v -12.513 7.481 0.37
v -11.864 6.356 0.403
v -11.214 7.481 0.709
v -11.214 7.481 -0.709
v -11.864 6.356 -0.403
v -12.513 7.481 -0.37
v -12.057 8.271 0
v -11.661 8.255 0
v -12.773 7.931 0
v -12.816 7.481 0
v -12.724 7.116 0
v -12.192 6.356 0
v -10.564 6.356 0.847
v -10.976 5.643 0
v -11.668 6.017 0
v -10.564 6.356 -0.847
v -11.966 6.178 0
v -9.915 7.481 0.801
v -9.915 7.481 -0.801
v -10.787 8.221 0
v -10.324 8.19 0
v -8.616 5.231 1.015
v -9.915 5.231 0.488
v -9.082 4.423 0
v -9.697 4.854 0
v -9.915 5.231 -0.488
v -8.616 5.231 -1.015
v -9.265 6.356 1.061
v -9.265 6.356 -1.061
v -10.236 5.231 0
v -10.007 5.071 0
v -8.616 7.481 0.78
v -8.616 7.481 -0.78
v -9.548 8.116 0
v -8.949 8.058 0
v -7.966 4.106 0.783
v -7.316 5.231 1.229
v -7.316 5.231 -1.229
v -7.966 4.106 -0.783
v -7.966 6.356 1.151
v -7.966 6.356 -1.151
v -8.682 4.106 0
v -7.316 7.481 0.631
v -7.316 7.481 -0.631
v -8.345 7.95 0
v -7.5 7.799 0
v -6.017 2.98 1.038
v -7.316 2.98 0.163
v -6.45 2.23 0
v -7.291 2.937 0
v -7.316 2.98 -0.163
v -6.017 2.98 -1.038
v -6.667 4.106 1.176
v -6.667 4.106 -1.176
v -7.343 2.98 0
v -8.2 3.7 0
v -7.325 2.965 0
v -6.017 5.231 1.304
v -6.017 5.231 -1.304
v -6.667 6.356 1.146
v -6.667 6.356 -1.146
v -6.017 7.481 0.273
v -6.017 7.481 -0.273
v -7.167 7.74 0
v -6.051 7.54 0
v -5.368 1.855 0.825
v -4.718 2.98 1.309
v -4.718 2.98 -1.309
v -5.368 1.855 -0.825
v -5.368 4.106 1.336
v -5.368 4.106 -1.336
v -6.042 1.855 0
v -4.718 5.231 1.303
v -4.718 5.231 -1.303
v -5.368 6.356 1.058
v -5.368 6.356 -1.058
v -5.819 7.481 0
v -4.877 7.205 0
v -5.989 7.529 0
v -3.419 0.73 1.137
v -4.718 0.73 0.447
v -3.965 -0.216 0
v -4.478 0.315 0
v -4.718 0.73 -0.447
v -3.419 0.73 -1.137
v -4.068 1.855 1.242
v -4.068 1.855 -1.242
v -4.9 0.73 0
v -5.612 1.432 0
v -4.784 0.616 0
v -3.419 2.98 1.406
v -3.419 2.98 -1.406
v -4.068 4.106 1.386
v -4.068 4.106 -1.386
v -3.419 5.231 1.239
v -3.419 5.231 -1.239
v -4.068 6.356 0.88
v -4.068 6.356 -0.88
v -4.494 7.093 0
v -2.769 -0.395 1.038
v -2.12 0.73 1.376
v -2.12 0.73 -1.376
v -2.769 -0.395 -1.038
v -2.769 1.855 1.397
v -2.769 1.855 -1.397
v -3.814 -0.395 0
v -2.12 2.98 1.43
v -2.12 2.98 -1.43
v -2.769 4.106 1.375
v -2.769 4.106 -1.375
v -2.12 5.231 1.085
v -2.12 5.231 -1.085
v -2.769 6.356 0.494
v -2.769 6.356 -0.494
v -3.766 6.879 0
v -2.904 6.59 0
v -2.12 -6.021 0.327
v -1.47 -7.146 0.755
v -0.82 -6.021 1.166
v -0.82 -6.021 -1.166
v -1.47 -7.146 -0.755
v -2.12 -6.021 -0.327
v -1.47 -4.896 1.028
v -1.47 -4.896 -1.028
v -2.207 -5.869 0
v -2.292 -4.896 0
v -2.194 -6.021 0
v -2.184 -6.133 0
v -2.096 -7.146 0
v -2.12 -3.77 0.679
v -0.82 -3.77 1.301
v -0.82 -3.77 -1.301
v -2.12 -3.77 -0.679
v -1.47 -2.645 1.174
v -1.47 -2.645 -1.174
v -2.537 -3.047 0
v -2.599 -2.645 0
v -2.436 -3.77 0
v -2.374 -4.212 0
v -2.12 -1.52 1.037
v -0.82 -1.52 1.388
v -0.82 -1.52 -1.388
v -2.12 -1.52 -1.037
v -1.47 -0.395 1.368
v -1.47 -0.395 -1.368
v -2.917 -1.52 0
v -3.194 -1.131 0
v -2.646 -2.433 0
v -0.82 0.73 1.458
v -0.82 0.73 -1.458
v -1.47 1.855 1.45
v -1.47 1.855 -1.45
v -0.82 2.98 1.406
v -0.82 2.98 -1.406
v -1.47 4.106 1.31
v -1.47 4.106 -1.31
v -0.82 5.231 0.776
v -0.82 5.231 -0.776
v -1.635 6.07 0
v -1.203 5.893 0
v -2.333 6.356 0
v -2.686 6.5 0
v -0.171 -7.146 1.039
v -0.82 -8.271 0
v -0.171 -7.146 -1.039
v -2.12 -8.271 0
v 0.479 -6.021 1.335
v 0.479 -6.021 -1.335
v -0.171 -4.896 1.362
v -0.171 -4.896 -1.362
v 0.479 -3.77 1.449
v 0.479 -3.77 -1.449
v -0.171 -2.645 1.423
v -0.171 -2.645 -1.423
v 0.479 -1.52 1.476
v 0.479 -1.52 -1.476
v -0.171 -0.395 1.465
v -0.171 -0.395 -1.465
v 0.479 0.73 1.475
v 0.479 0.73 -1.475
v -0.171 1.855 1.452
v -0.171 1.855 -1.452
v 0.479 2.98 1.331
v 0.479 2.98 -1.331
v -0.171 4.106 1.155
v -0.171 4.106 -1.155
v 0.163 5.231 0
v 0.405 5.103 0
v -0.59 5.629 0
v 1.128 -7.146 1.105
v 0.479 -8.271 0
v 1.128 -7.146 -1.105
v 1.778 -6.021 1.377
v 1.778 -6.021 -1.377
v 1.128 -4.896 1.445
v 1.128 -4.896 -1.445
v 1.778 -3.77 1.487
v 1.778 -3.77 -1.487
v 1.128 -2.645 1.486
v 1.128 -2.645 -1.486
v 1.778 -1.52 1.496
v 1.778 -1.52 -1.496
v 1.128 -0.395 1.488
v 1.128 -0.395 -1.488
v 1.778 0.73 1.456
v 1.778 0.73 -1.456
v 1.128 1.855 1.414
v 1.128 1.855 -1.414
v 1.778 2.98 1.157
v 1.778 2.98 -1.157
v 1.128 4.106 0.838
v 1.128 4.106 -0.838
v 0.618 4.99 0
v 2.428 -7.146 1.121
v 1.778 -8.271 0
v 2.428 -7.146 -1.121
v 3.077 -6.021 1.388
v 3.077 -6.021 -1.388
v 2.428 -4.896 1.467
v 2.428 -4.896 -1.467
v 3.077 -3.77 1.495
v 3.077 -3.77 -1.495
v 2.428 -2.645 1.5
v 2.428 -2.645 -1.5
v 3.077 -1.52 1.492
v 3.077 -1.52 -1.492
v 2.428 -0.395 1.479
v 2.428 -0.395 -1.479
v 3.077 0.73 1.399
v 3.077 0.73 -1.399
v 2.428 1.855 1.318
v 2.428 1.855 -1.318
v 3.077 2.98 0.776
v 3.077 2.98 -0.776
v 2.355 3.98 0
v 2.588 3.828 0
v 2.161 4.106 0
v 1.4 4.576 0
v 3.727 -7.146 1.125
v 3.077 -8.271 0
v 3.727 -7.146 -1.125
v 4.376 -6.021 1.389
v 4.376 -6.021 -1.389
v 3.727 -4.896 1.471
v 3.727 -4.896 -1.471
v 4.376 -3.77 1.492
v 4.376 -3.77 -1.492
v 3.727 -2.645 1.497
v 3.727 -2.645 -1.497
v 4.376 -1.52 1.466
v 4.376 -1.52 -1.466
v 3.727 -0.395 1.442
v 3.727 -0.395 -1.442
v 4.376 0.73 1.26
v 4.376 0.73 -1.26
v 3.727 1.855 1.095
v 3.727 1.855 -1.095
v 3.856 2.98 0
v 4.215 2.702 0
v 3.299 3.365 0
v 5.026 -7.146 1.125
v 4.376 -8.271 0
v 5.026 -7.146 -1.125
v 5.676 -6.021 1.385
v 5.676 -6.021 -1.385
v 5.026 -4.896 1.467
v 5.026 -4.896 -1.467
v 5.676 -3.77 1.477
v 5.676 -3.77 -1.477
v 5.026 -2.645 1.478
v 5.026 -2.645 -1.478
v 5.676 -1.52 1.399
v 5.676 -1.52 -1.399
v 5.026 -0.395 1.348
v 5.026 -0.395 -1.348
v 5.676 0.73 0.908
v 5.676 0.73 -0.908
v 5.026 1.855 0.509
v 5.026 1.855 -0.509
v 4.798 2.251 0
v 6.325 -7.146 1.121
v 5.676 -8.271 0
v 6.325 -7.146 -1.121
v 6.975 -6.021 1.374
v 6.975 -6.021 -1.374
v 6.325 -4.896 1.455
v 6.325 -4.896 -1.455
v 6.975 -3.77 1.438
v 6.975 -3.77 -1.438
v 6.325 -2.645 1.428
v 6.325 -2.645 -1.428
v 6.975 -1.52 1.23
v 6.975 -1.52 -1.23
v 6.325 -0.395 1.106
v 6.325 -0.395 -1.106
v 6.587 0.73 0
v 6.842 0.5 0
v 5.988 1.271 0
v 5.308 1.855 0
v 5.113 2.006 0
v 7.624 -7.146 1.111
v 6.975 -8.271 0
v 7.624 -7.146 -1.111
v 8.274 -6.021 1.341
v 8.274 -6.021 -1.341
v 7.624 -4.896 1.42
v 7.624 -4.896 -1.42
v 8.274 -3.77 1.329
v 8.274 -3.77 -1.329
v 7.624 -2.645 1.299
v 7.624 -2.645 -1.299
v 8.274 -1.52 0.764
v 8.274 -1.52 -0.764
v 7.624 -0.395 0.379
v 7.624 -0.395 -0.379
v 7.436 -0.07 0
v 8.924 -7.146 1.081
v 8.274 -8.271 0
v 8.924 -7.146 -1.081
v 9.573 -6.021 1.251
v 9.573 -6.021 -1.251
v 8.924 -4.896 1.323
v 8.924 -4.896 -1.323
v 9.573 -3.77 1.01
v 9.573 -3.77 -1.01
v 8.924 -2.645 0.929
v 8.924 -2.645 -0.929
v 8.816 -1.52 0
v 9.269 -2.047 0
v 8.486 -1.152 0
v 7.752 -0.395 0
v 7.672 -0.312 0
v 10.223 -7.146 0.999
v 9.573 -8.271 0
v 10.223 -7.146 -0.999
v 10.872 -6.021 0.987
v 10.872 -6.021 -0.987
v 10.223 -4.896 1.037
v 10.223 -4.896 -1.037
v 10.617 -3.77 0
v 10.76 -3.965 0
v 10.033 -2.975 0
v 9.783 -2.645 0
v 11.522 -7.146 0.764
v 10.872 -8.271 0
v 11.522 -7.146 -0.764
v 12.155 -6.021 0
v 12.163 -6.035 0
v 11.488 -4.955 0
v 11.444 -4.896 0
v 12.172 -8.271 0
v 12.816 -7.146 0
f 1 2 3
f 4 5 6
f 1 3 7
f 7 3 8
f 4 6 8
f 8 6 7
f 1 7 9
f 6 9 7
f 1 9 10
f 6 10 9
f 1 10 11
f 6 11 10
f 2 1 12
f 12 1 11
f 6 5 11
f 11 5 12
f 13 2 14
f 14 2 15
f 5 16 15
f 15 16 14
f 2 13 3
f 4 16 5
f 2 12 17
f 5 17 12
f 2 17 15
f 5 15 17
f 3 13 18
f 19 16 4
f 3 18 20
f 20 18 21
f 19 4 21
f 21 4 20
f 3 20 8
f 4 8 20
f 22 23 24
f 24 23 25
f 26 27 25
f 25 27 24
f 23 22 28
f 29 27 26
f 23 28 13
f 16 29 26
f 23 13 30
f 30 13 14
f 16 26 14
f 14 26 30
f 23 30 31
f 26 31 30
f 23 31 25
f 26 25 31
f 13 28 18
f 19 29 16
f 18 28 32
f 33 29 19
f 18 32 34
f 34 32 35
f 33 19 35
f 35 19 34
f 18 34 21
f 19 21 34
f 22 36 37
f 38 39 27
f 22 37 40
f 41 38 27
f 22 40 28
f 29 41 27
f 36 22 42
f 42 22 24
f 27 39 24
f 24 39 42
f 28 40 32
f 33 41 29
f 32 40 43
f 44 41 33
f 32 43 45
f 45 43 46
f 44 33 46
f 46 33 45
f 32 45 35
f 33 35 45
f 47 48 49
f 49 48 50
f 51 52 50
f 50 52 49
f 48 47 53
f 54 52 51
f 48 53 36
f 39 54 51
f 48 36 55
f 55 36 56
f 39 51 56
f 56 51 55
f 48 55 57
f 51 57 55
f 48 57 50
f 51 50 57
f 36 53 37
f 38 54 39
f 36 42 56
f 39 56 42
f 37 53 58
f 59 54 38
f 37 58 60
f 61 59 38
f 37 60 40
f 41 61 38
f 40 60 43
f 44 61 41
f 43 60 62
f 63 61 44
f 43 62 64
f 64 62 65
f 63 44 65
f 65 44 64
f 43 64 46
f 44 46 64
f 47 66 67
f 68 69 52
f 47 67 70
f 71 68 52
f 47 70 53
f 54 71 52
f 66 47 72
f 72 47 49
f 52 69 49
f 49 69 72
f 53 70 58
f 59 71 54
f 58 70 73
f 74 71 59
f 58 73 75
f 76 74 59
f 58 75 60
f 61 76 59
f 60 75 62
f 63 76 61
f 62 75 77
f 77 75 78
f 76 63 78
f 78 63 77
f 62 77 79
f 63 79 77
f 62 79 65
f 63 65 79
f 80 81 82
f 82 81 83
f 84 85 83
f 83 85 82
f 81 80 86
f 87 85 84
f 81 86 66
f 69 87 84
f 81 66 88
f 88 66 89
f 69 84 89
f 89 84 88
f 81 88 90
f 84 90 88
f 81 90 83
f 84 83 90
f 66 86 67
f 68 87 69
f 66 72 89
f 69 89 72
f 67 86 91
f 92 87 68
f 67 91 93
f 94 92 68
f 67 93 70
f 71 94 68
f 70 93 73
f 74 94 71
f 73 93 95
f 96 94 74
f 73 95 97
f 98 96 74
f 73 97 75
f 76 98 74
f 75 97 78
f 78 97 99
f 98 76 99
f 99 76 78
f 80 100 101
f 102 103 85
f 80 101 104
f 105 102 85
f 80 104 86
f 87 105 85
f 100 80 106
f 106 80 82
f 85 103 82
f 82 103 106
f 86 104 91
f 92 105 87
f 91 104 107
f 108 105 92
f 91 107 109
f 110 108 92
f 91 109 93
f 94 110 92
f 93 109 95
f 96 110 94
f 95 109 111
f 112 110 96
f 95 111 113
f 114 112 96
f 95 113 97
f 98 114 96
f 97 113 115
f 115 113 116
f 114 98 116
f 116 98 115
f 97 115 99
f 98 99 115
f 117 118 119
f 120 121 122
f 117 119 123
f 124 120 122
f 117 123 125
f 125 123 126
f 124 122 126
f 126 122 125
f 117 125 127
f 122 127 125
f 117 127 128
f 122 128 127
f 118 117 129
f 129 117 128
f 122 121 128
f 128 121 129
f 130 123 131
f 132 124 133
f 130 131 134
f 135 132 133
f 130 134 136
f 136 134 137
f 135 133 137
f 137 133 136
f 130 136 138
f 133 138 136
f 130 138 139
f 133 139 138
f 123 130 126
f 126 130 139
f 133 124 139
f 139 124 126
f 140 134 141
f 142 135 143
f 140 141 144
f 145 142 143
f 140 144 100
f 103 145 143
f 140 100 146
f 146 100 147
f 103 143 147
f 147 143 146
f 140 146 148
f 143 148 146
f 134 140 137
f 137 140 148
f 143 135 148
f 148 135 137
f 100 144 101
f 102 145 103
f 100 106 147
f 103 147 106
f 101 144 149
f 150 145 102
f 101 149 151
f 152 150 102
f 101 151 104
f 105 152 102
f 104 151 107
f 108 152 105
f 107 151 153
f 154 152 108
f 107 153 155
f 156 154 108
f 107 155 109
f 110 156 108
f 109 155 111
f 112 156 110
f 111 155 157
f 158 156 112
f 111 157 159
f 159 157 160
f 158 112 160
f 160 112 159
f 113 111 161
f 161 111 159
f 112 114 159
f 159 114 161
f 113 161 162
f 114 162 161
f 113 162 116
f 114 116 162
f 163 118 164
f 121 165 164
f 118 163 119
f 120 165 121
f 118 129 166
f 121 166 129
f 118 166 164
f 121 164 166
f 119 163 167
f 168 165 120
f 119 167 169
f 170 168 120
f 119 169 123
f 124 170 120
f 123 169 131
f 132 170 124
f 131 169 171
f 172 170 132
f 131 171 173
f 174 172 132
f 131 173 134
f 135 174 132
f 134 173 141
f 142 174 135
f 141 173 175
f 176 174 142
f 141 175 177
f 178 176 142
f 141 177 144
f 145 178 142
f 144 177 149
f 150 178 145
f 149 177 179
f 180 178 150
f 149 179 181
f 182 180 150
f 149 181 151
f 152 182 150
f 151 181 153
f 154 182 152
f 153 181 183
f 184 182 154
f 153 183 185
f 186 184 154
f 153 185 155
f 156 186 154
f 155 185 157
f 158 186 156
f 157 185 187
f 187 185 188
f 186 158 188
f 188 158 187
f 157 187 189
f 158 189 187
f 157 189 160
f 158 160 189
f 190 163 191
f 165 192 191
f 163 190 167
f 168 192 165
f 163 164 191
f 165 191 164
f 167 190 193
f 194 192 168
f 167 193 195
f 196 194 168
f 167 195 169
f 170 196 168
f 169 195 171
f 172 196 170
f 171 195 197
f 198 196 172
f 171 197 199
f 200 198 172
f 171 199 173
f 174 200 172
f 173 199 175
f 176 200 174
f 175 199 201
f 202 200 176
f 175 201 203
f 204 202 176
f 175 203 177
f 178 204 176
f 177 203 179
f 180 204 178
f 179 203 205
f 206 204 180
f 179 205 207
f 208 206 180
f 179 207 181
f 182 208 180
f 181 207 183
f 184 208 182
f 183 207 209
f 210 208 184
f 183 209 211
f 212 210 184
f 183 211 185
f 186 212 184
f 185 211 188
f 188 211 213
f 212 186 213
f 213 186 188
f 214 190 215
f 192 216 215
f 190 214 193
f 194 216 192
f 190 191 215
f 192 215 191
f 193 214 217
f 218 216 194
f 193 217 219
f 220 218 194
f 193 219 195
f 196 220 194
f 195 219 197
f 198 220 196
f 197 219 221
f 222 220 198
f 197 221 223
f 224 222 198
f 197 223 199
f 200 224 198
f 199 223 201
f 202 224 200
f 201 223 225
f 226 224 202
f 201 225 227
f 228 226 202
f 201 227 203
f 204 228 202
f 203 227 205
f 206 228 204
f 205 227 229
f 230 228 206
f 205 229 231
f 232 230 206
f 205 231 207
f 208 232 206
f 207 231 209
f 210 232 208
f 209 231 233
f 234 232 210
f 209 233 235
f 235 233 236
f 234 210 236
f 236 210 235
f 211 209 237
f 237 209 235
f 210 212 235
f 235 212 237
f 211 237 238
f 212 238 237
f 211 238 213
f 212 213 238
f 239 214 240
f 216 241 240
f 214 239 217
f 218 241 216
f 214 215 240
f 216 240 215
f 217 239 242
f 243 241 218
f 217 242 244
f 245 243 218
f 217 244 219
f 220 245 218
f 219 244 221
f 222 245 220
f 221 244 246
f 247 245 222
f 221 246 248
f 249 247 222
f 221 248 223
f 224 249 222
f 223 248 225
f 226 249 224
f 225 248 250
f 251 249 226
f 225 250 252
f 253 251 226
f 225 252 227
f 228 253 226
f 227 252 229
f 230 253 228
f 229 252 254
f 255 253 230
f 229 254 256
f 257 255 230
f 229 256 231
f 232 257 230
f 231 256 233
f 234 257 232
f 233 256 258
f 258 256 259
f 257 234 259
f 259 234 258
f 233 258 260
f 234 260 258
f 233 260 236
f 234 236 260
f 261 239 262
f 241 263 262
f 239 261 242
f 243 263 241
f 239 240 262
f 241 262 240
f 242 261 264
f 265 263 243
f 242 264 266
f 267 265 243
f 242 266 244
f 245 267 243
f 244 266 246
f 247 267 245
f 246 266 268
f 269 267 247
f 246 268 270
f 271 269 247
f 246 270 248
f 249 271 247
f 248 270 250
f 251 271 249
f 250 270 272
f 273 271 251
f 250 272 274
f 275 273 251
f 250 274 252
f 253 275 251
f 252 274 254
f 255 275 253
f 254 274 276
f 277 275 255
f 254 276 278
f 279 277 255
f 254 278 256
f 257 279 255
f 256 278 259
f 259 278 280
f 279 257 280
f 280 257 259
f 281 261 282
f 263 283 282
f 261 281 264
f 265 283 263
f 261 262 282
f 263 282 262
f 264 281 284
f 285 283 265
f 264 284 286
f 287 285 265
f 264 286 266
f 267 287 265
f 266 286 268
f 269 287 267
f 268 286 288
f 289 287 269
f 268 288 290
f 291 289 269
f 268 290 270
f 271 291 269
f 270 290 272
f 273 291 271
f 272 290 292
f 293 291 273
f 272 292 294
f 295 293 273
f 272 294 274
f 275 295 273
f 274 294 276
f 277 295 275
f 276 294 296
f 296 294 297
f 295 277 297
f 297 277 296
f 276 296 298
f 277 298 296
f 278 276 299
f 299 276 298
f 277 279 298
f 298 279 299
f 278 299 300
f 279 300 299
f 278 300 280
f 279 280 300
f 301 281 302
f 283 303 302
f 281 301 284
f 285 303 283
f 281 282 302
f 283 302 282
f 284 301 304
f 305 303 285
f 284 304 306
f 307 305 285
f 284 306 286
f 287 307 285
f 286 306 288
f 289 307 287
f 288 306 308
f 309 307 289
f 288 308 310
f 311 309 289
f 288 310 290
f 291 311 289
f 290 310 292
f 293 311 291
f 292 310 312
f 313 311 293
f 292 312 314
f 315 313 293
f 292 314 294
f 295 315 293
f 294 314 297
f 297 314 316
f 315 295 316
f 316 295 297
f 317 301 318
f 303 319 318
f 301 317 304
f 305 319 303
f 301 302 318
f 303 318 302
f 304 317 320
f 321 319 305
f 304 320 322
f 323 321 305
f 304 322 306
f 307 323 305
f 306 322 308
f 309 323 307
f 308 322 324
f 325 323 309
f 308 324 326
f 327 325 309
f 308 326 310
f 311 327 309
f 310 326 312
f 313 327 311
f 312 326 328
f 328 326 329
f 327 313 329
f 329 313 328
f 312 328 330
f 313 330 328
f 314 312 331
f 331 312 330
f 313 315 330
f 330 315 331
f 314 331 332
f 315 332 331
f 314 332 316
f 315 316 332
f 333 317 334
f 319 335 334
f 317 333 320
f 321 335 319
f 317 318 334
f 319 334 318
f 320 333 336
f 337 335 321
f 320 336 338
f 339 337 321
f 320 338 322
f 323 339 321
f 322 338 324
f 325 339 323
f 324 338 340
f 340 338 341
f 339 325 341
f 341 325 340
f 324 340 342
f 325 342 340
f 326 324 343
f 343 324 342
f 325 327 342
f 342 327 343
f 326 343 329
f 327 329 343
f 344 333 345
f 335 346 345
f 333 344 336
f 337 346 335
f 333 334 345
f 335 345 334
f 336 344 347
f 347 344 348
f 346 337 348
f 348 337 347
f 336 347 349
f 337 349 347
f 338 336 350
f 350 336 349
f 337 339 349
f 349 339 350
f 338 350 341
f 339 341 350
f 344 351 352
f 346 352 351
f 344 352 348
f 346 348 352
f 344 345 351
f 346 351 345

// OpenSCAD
center_inflated_sight_2 = [91.31887,78.30286];
size_inflated_sight_2 = [25.63138,16.54185];
color_inflated_sight_2 = [1.00000,0.00000,0.00000];

module inflated_sight_2() {
  color(color_inflated_sight_2) polyhedron(points=[[-11.21400,7.48098,0.70859],[-11.86360,6.35585,0.40251],[-12.51320,7.48098,0.36971],[-12.51320,7.48098,-0.36971],[-11.86360,6.35585,-0.40251],[-11.21400,7.48098,-0.70859],[-12.05712,8.27093,0.00000],[-11.66101,8.25523,0.00000],[-12.77291,7.93082,0.00000],[-12.81569,7.48098,0.00000],[-12.72401,7.11584,0.00000],[-12.19219,6.35585,0.00000],[-10.97581,5.64326,0.00000],[-10.56440,6.35585,0.84722],[-11.66778,6.01669,0.00000],[-10.56440,6.35585,-0.84722],[-11.96638,6.17783,0.00000],[-9.91480,7.48098,0.80131],[-9.91480,7.48098,-0.80131],[-10.78698,8.22060,0.00000],[-10.32415,8.19000,0.00000],[-9.08174,4.42335,0.00000],[-9.91480,5.23071,0.48819],[-8.61561,5.23071,1.01451],[-9.69720,4.85380,0.00000],[-8.61561,5.23071,-1.01451],[-9.91480,5.23071,-0.48819],[-9.26521,6.35585,1.06120],[-9.26521,6.35585,-1.06120],[-10.23611,5.23071,0.00000],[-10.00722,5.07063,0.00000],[-8.61561,7.48098,0.78050],[-8.61561,7.48098,-0.78050],[-9.54804,8.11623,0.00000],[-8.94883,8.05815,0.00000],[-7.31641,5.23071,1.22947],[-7.96601,4.10557,0.78275],[-7.96601,4.10557,-0.78275],[-7.31641,5.23071,-1.22947],[-7.96601,6.35585,1.15088],[-7.96601,6.35585,-1.15088],[-8.68215,4.10557,0.00000],[-7.31641,7.48098,0.63053],[-7.31641,7.48098,-0.63053],[-8.34473,7.95016,0.00000],[-7.50012,7.79917,0.00000],[-6.45023,2.23043,0.00000],[-7.31641,2.98044,0.16311],[-6.01722,2.98044,1.03806],[-7.29143,2.93716,0.00000],[-6.01722,2.98044,-1.03806],[-7.31641,2.98044,-0.16311],[-6.66682,4.10557,1.17564],[-6.66682,4.10557,-1.17564],[-7.34294,2.98044,0.00000],[-8.19992,3.70043,0.00000],[-7.32508,2.96543,0.00000],[-6.01722,5.23071,1.30394],[-6.01722,5.23071,-1.30394],[-6.66682,6.35585,1.14574],[-6.66682,6.35585,-1.14574],[-6.01722,7.48098,0.27347],[-6.01722,7.48098,-0.27347],[-7.16708,7.73964,0.00000],[-6.05140,7.54019,0.00000],[-4.71802,2.98044,1.30881],[-5.36762,1.85530,0.82454],[-5.36762,1.85530,-0.82454],[-4.71802,2.98044,-1.30881],[-5.36762,4.10557,1.33578],[-5.36762,4.10557,-1.33578],[-6.04248,1.85530,0.00000],[-4.71802,5.23071,1.30294],[-4.71802,5.23071,-1.30294],[-5.36762,6.35585,1.05756],[-5.36762,6.35585,-1.05756],[-5.81937,7.48098,0.00000],[-4.87738,7.20496,0.00000],[-5.98943,7.52912,0.00000],[-3.96498,-0.21580,0.00000],[-4.71802,0.73016,0.44680],[-3.41883,0.73016,1.13747],[-4.47832,0.31498,0.00000],[-3.41883,0.73016,-1.13747],[-4.71802,0.73016,-0.44680],[-4.06842,1.85530,1.24194],[-4.06842,1.85530,-1.24194],[-4.89993,0.73016,0.00000],[-5.61224,1.43161,0.00000],[-4.78396,0.61596,0.00000],[-3.41883,2.98044,1.40628],[-3.41883,2.98044,-1.40628],[-4.06842,4.10557,1.38630],[-4.06842,4.10557,-1.38630],[-3.41883,5.23071,1.23858],[-3.41883,5.23071,-1.23858],[-4.06842,6.35585,0.88026],[-4.06842,6.35585,-0.88026],[-4.49376,7.09255,0.00000],[-2.11963,0.73016,1.37644],[-2.76923,-0.39497,1.03803],[-2.76923,-0.39497,-1.03803],[-2.11963,0.73016,-1.37644],[-2.76923,1.85530,1.39656],[-2.76923,1.85530,-1.39656],[-3.81412,-0.39497,0.00000],[-2.11963,2.98044,1.42970],[-2.11963,2.98044,-1.42970],[-2.76923,4.10557,1.37532],[-2.76923,4.10557,-1.37532],[-2.11963,5.23071,1.08496],[-2.11963,5.23071,-1.08496],[-2.76923,6.35585,0.49386],[-2.76923,6.35585,-0.49386],[-3.76618,6.87935,0.00000],[-2.90430,6.58980,0.00000],[-0.82043,-6.02065,1.16619],[-1.47003,-7.14579,0.75486],[-2.11963,-6.02065,0.32664],[-2.11963,-6.02065,-0.32664],[-1.47003,-7.14579,-0.75486],[-0.82043,-6.02065,-1.16619],[-1.47003,-4.89552,1.02828],[-1.47003,-4.89552,-1.02828],[-2.20723,-5.86893,0.00000],[-2.29173,-4.89552,0.00000],[-2.19406,-6.02065,0.00000],[-2.18433,-6.13272,0.00000],[-2.09639,-7.14579,0.00000],[-0.82043,-3.77038,1.30053],[-2.11963,-3.77038,0.67852],[-2.11963,-3.77038,-0.67852],[-0.82043,-3.77038,-1.30053],[-1.47003,-2.64525,1.17365],[-1.47003,-2.64525,-1.17365],[-2.53704,-3.04741,0.00000],[-2.59885,-2.64525,0.00000],[-2.43602,-3.77038,0.00000],[-2.37437,-4.21160,0.00000],[-0.82043,-1.52011,1.38765],[-2.11963,-1.52011,1.03680],[-2.11963,-1.52011,-1.03680],[-0.82043,-1.52011,-1.38765],[-1.47003,-0.39497,1.36798],[-1.47003,-0.39497,-1.36798],[-2.91687,-1.52011,0.00000],[-3.19428,-1.13119,0.00000],[-2.64641,-2.43252,0.00000],[-0.82043,0.73016,1.45773],[-0.82043,0.73016,-1.45773],[-1.47003,1.85530,1.44974],[-1.47003,1.85530,-1.44974],[-0.82043,2.98044,1.40612],[-0.82043,2.98044,-1.40612],[-1.47003,4.10557,1.30988],[-1.47003,4.10557,-1.30988],[-0.82043,5.23071,0.77630],[-0.82043,5.23071,-0.77630],[-1.63514,6.06986,0.00000],[-1.20262,5.89267,0.00000],[-2.33322,6.35585,0.00000],[-2.68583,6.50030,0.00000],[-0.82043,-8.27093,0.00000],[-0.17084,-7.14579,1.03865],[-0.17084,-7.14579,-1.03865],[-2.11963,-8.27093,0.00000],[0.47876,-6.02065,1.33509],[0.47876,-6.02065,-1.33509],[-0.17084,-4.89552,1.36158],[-0.17084,-4.89552,-1.36158],[0.47876,-3.77038,1.44870],[0.47876,-3.77038,-1.44870],[-0.17084,-2.64525,1.42327],[-0.17084,-2.64525,-1.42327],[0.47876,-1.52011,1.47632],[0.47876,-1.52011,-1.47632],[-0.17084,-0.39497,1.46547],[-0.17084,-0.39497,-1.46547],[0.47876,0.73016,1.47454],[0.47876,0.73016,-1.47454],[-0.17084,1.85530,1.45164],[-0.17084,1.85530,-1.45164],[0.47876,2.98044,1.33091],[0.47876,2.98044,-1.33091],[-0.17084,4.10557,1.15477],[-0.17084,4.10557,-1.15477],[0.16276,5.23071,0.00000],[0.40485,5.10270,0.00000],[-0.59048,5.62901,0.00000],[0.47876,-8.27093,0.00000],[1.12836,-7.14579,1.10489],[1.12836,-7.14579,-1.10489],[1.77796,-6.02065,1.37716],[1.77796,-6.02065,-1.37716],[1.12836,-4.89552,1.44531],[1.12836,-4.89552,-1.44531],[1.77796,-3.77038,1.48722],[1.77796,-3.77038,-1.48722],[1.12836,-2.64525,1.48606],[1.12836,-2.64525,-1.48606],[1.77796,-1.52011,1.49631],[1.77796,-1.52011,-1.49631],[1.12836,-0.39497,1.48789],[1.12836,-0.39497,-1.48789],[1.77796,0.73016,1.45647],[1.77796,0.73016,-1.45647],[1.12836,1.85530,1.41359],[1.12836,1.85530,-1.41359],[1.77796,2.98044,1.15716],[1.77796,2.98044,-1.15716],[1.12836,4.10557,0.83790],[1.12836,4.10557,-0.83790],[0.61763,4.99018,0.00000],[1.77796,-8.27093,0.00000],[2.42755,-7.14579,1.12140],[2.42755,-7.14579,-1.12140],[3.07715,-6.02065,1.38751],[3.07715,-6.02065,-1.38751],[2.42755,-4.89552,1.46677],[2.42755,-4.89552,-1.46677],[3.07715,-3.77038,1.49542],[3.07715,-3.77038,-1.49542],[2.42755,-2.64525,1.50000],[2.42755,-2.64525,-1.50000],[3.07715,-1.52011,1.49162],[3.07715,-1.52011,-1.49162],[2.42755,-0.39497,1.47932],[2.42755,-0.39497,-1.47932],[3.07715,0.73016,1.39864],[3.07715,0.73016,-1.39864],[2.42755,1.85530,1.31848],[2.42755,1.85530,-1.31848],[3.07715,2.98044,0.77569],[3.07715,2.98044,-0.77569],[2.35479,3.97954,0.00000],[2.58783,3.82797,0.00000],[2.16102,4.10557,0.00000],[1.40018,4.57638,0.00000],[3.07715,-8.27093,0.00000],[3.72675,-7.14579,1.12517],[3.72675,-7.14579,-1.12517],[4.37635,-6.02065,1.38874],[4.37635,-6.02065,-1.38874],[3.72675,-4.89552,1.47076],[3.72675,-4.89552,-1.47076],[4.37635,-3.77038,1.49216],[4.37635,-3.77038,-1.49216],[3.72675,-2.64525,1.49652],[3.72675,-2.64525,-1.49652],[4.37635,-1.52011,1.46597],[4.37635,-1.52011,-1.46597],[3.72675,-0.39497,1.44211],[3.72675,-0.39497,-1.44211],[4.37635,0.73016,1.25998],[4.37635,0.73016,-1.25998],[3.72675,1.85530,1.09465],[3.72675,1.85530,-1.09465],[3.85587,2.98044,0.00000],[4.21550,2.70184,0.00000],[3.29930,3.36521,0.00000],[4.37635,-8.27093,0.00000],[5.02595,-7.14579,1.12484],[5.02595,-7.14579,-1.12484],[5.67554,-6.02065,1.38514],[5.67554,-6.02065,-1.38514],[5.02595,-4.89552,1.46738],[5.02595,-4.89552,-1.46738],[5.67554,-3.77038,1.47747],[5.67554,-3.77038,-1.47747],[5.02595,-2.64525,1.47776],[5.02595,-2.64525,-1.47776],[5.67554,-1.52011,1.39915],[5.67554,-1.52011,-1.39915],[5.02595,-0.39497,1.34823],[5.02595,-0.39497,-1.34823],[5.67554,0.73016,0.90787],[5.67554,0.73016,-0.90787],[5.02595,1.85530,0.50901],[5.02595,1.85530,-0.50901],[4.79751,2.25097,0.00000],[5.67554,-8.27093,0.00000],[6.32514,-7.14579,1.12121],[6.32514,-7.14579,-1.12121],[6.97474,-6.02065,1.37360],[6.97474,-6.02065,-1.37360],[6.32514,-4.89552,1.45485],[6.32514,-4.89552,-1.45485],[6.97474,-3.77038,1.43769],[6.97474,-3.77038,-1.43769],[6.32514,-2.64525,1.42823],[6.32514,-2.64525,-1.42823],[6.97474,-1.52011,1.22979],[6.97474,-1.52011,-1.22979],[6.32514,-0.39497,1.10567],[6.32514,-0.39497,-1.10567],[6.58733,0.73016,0.00000],[6.84211,0.50044,0.00000],[5.98769,1.27082,0.00000],[5.30826,1.85530,0.00000],[5.11319,2.00641,0.00000],[6.97474,-8.27093,0.00000],[7.62434,-7.14579,1.11057],[7.62434,-7.14579,-1.11057],[8.27393,-6.02065,1.34138],[8.27393,-6.02065,-1.34138],[7.62434,-4.89552,1.42011],[7.62434,-4.89552,-1.42011],[8.27393,-3.77038,1.32928],[8.27393,-3.77038,-1.32928],[7.62434,-2.64525,1.29947],[7.62434,-2.64525,-1.29947],[8.27393,-1.52011,0.76385],[8.27393,-1.52011,-0.76385],[7.62434,-0.39497,0.37851],[7.62434,-0.39497,-0.37851],[7.43648,-0.06960,0.00000],[8.27393,-8.27093,0.00000],[8.92353,-7.14579,1.08102],[8.92353,-7.14579,-1.08102],[9.57313,-6.02065,1.25095],[9.57313,-6.02065,-1.25095],[8.92353,-4.89552,1.32301],[8.92353,-4.89552,-1.32301],[9.57313,-3.77038,1.00957],[9.57313,-3.77038,-1.00957],[8.92353,-2.64525,0.92948],[8.92353,-2.64525,-0.92948],[8.81611,-1.52011,0.00000],[9.26888,-2.04709,0.00000],[8.48628,-1.15231,0.00000],[7.75196,-0.39497,0.00000],[7.67197,-0.31247,0.00000],[9.57313,-8.27093,0.00000],[10.22273,-7.14579,0.99863],[10.22273,-7.14579,-0.99863],[10.87233,-6.02065,0.98716],[10.87233,-6.02065,-0.98716],[10.22273,-4.89552,1.03651],[10.22273,-4.89552,-1.03651],[10.61719,-3.77038,0.00000],[10.76005,-3.96485,0.00000],[10.03259,-2.97457,0.00000],[9.78279,-2.64525,0.00000],[10.87233,-8.27093,0.00000],[11.52192,-7.14579,0.76378],[11.52192,-7.14579,-0.76378],[12.15524,-6.02065,0.00000],[12.16345,-6.03464,0.00000],[11.48750,-4.95514,0.00000],[11.44371,-4.89552,0.00000],[12.81569,-7.14579,0.00000],[12.17152,-8.27093,0.00000]], faces=[[0,1,2],[3,4,5],[6,0,2],[7,0,6],[7,3,5],[6,3,7],[8,6,2],[6,8,3],[9,8,2],[8,9,3],[10,9,2],[9,10,3],[11,2,1],[10,2,11],[10,4,3],[11,4,10],[12,1,13],[14,1,12],[14,15,4],[12,15,14],[0,13,1],[4,15,5],[16,11,1],[11,16,4],[14,16,1],[16,14,4],[17,13,0],[5,15,18],[19,17,0],[20,17,19],[20,5,18],[19,5,20],[7,19,0],[19,7,5],[21,22,23],[24,22,21],[24,25,26],[21,25,24],[27,23,22],[26,25,28],[13,27,22],[26,28,15],[29,13,22],[12,13,29],[12,26,15],[29,26,12],[30,29,22],[29,30,26],[24,30,22],[30,24,26],[17,27,13],[15,28,18],[31,27,17],[18,28,32],[33,31,17],[34,31,33],[34,18,32],[33,18,34],[20,33,17],[33,20,18],[35,36,23],[25,37,38],[39,35,23],[25,38,40],[27,39,23],[25,40,28],[41,23,36],[21,23,41],[21,37,25],[41,37,21],[31,39,27],[28,40,32],[42,39,31],[32,40,43],[44,42,31],[45,42,44],[45,32,43],[44,32,45],[34,44,31],[44,34,32],[46,47,48],[49,47,46],[49,50,51],[46,50,49],[52,48,47],[51,50,53],[36,52,47],[51,53,37],[54,36,47],[55,36,54],[55,51,37],[54,51,55],[56,54,47],[54,56,51],[49,56,47],[56,49,51],[35,52,36],[37,53,38],[55,41,36],[41,55,37],[57,52,35],[38,53,58],[59,57,35],[38,58,60],[39,59,35],[38,60,40],[42,59,39],[40,60,43],[61,59,42],[43,60,62],[63,61,42],[64,61,63],[64,43,62],[63,43,64],[45,63,42],[63,45,43],[65,66,48],[50,67,68],[69,65,48],[50,68,70],[52,69,48],[50,70,53],[71,48,66],[46,48,71],[46,67,50],[71,67,46],[57,69,52],[53,70,58],[72,69,57],[58,70,73],[74,72,57],[58,73,75],[59,74,57],[58,75,60],[61,74,59],[60,75,62],[76,74,61],[77,74,76],[77,62,75],[76,62,77],[78,76,61],[76,78,62],[64,78,61],[78,64,62],[79,80,81],[82,80,79],[82,83,84],[79,83,82],[85,81,80],[84,83,86],[66,85,80],[84,86,67],[87,66,80],[88,66,87],[88,84,67],[87,84,88],[89,87,80],[87,89,84],[82,89,80],[89,82,84],[65,85,66],[67,86,68],[88,71,66],[71,88,67],[90,85,65],[68,86,91],[92,90,65],[68,91,93],[69,92,65],[68,93,70],[72,92,69],[70,93,73],[94,92,72],[73,93,95],[96,94,72],[73,95,97],[74,96,72],[73,97,75],[77,96,74],[98,96,77],[98,75,97],[77,75,98],[99,100,81],[83,101,102],[103,99,81],[83,102,104],[85,103,81],[83,104,86],[105,81,100],[79,81,105],[79,101,83],[105,101,79],[90,103,85],[86,104,91],[106,103,90],[91,104,107],[108,106,90],[91,107,109],[92,108,90],[91,109,93],[94,108,92],[93,109,95],[110,108,94],[95,109,111],[112,110,94],[95,111,113],[96,112,94],[95,113,97],[114,112,96],[115,112,114],[115,97,113],[114,97,115],[98,114,96],[114,98,97],[116,117,118],[119,120,121],[122,116,118],[119,121,123],[124,122,118],[125,122,124],[125,119,123],[124,119,125],[126,124,118],[124,126,119],[127,126,118],[126,127,119],[128,118,117],[127,118,128],[127,120,119],[128,120,127],[129,122,130],[131,123,132],[133,129,130],[131,132,134],[135,133,130],[136,133,135],[136,131,134],[135,131,136],[137,135,130],[135,137,131],[138,137,130],[137,138,131],[125,130,122],[138,130,125],[138,123,131],[125,123,138],[139,133,140],[141,134,142],[143,139,140],[141,142,144],[100,143,140],[141,144,101],[145,100,140],[146,100,145],[146,141,101],[145,141,146],[147,145,140],[145,147,141],[136,140,133],[147,140,136],[147,134,141],[136,134,147],[99,143,100],[101,144,102],[146,105,100],[105,146,101],[148,143,99],[102,144,149],[150,148,99],[102,149,151],[103,150,99],[102,151,104],[106,150,103],[104,151,107],[152,150,106],[107,151,153],[154,152,106],[107,153,155],[108,154,106],[107,155,109],[110,154,108],[109,155,111],[156,154,110],[111,155,157],[158,156,110],[159,156,158],[159,111,157],[158,111,159],[160,110,112],[158,110,160],[158,113,111],[160,113,158],[161,160,112],[160,161,113],[115,161,112],[161,115,113],[162,117,163],[162,164,120],[116,163,117],[120,164,121],[165,128,117],[128,165,120],[162,165,117],[165,162,120],[166,163,116],[121,164,167],[168,166,116],[121,167,169],[122,168,116],[121,169,123],[129,168,122],[123,169,132],[170,168,129],[132,169,171],[172,170,129],[132,171,173],[133,172,129],[132,173,134],[139,172,133],[134,173,142],[174,172,139],[142,173,175],[176,174,139],[142,175,177],[143,176,139],[142,177,144],[148,176,143],[144,177,149],[178,176,148],[149,177,179],[180,178,148],[149,179,181],[150,180,148],[149,181,151],[152,180,150],[151,181,153],[182,180,152],[153,181,183],[184,182,152],[153,183,185],[154,184,152],[153,185,155],[156,184,154],[155,185,157],[186,184,156],[187,184,186],[187,157,185],[186,157,187],[188,186,156],[186,188,157],[159,188,156],[188,159,157],[189,163,190],[189,191,164],[166,190,163],[164,191,167],[189,162,163],[162,189,164],[192,190,166],[167,191,193],[194,192,166],[167,193,195],[168,194,166],[167,195,169],[170,194,168],[169,195,171],[196,194,170],[171,195,197],[198,196,170],[171,197,199],[172,198,170],[171,199,173],[174,198,172],[173,199,175],[200,198,174],[175,199,201],[202,200,174],[175,201,203],[176,202,174],[175,203,177],[178,202,176],[177,203,179],[204,202,178],[179,203,205],[206,204,178],[179,205,207],[180,206,178],[179,207,181],[182,206,180],[181,207,183],[208,206,182],[183,207,209],[210,208,182],[183,209,211],[184,210,182],[183,211,185],[187,210,184],[212,210,187],[212,185,211],[187,185,212],[213,190,214],[213,215,191],[192,214,190],[191,215,193],[213,189,190],[189,213,191],[216,214,192],[193,215,217],[218,216,192],[193,217,219],[194,218,192],[193,219,195],[196,218,194],[195,219,197],[220,218,196],[197,219,221],[222,220,196],[197,221,223],[198,222,196],[197,223,199],[200,222,198],[199,223,201],[224,222,200],[201,223,225],[226,224,200],[201,225,227],[202,226,200],[201,227,203],[204,226,202],[203,227,205],[228,226,204],[205,227,229],[230,228,204],[205,229,231],[206,230,204],[205,231,207],[208,230,206],[207,231,209],[232,230,208],[209,231,233],[234,232,208],[235,232,234],[235,209,233],[234,209,235],[236,208,210],[234,208,236],[234,211,209],[236,211,234],[237,236,210],[236,237,211],[212,237,210],[237,212,211],[238,214,239],[238,240,215],[216,239,214],[215,240,217],[238,213,214],[213,238,215],[241,239,216],[217,240,242],[243,241,216],[217,242,244],[218,243,216],[217,244,219],[220,243,218],[219,244,221],[245,243,220],[221,244,246],[247,245,220],[221,246,248],[222,247,220],[221,248,223],[224,247,222],[223,248,225],[249,247,224],[225,248,250],[251,249,224],[225,250,252],[226,251,224],[225,252,227],[228,251,226],[227,252,229],[253,251,228],[229,252,254],[255,253,228],[229,254,256],[230,255,228],[229,256,231],[232,255,230],[231,256,233],[257,255,232],[258,255,257],[258,233,256],[257,233,258],[259,257,232],[257,259,233],[235,259,232],[259,235,233],[260,239,261],[260,262,240],[241,261,239],[240,262,242],[260,238,239],[238,260,240],[263,261,241],[242,262,264],[265,263,241],[242,264,266],[243,265,241],[242,266,244],[245,265,243],[244,266,246],[267,265,245],[246,266,268],[269,267,245],[246,268,270],[247,269,245],[246,270,248],[249,269,247],[248,270,250],[271,269,249],[250,270,272],[273,271,249],[250,272,274],[251,273,249],[250,274,252],[253,273,251],[252,274,254],[275,273,253],[254,274,276],[277,275,253],[254,276,278],[255,277,253],[254,278,256],[258,277,255],[279,277,258],[279,256,278],[258,256,279],[280,261,281],[280,282,262],[263,281,261],[262,282,264],[280,260,261],[260,280,262],[283,281,263],[264,282,284],[285,283,263],[264,284,286],[265,285,263],[264,286,266],[267,285,265],[266,286,268],[287,285,267],[268,286,288],[289,287,267],[268,288,290],[269,289,267],[268,290,270],[271,289,269],[270,290,272],[291,289,271],[272,290,292],[293,291,271],[272,292,294],[273,293,271],[272,294,274],[275,293,273],[274,294,276],[295,293,275],[296,293,295],[296,276,294],[295,276,296],[297,295,275],[295,297,276],[298,275,277],[297,275,298],[297,278,276],[298,278,297],[299,298,277],[298,299,278],[279,299,277],[299,279,278],[300,281,301],[300,302,282],[283,301,281],[282,302,284],[300,280,281],[280,300,282],[303,301,283],[284,302,304],[305,303,283],[284,304,306],[285,305,283],[284,306,286],[287,305,285],[286,306,288],[307,305,287],[288,306,308],[309,307,287],[288,308,310],[289,309,287],[288,310,290],[291,309,289],[290,310,292],[311,309,291],[292,310,312],[313,311,291],[292,312,314],[293,313,291],[292,314,294],[296,313,293],[315,313,296],[315,294,314],[296,294,315],[316,301,317],[316,318,302],[303,317,301],[302,318,304],[316,300,301],[300,316,302],[319,317,303],[304,318,320],[321,319,303],[304,320,322],[305,321,303],[304,322,306],[307,321,305],[306,322,308],[323,321,307],[308,322,324],[325,323,307],[308,324,326],[309,325,307],[308,326,310],[311,325,309],[310,326,312],[327,325,311],[328,325,327],[328,312,326],[327,312,328],[329,327,311],[327,329,312],[330,311,313],[329,311,330],[329,314,312],[330,314,329],[331,330,313],[330,331,314],[315,331,313],[331,315,314],[332,317,333],[332,334,318],[319,333,317],[318,334,320],[332,316,317],[316,332,318],[335,333,319],[320,334,336],[337,335,319],[320,336,338],[321,337,319],[320,338,322],[323,337,321],[322,338,324],[339,337,323],[340,337,339],[340,324,338],[339,324,340],[341,339,323],[339,341,324],[342,323,325],[341,323,342],[341,326,324],[342,326,341],[328,342,325],[342,328,326],[343,333,344],[343,345,334],[335,344,333],[334,345,336],[343,332,333],[332,343,334],[346,344,335],[347,344,346],[347,336,345],[346,336,347],[348,346,335],[346,348,336],[349,335,337],[348,335,349],[348,338,336],[349,338,348],[340,349,337],[349,340,338],[350,351,344],[351,350,345],[347,350,344],[350,347,345],[351,343,344],[343,351,345]]);
}

inflated_sight_2();
